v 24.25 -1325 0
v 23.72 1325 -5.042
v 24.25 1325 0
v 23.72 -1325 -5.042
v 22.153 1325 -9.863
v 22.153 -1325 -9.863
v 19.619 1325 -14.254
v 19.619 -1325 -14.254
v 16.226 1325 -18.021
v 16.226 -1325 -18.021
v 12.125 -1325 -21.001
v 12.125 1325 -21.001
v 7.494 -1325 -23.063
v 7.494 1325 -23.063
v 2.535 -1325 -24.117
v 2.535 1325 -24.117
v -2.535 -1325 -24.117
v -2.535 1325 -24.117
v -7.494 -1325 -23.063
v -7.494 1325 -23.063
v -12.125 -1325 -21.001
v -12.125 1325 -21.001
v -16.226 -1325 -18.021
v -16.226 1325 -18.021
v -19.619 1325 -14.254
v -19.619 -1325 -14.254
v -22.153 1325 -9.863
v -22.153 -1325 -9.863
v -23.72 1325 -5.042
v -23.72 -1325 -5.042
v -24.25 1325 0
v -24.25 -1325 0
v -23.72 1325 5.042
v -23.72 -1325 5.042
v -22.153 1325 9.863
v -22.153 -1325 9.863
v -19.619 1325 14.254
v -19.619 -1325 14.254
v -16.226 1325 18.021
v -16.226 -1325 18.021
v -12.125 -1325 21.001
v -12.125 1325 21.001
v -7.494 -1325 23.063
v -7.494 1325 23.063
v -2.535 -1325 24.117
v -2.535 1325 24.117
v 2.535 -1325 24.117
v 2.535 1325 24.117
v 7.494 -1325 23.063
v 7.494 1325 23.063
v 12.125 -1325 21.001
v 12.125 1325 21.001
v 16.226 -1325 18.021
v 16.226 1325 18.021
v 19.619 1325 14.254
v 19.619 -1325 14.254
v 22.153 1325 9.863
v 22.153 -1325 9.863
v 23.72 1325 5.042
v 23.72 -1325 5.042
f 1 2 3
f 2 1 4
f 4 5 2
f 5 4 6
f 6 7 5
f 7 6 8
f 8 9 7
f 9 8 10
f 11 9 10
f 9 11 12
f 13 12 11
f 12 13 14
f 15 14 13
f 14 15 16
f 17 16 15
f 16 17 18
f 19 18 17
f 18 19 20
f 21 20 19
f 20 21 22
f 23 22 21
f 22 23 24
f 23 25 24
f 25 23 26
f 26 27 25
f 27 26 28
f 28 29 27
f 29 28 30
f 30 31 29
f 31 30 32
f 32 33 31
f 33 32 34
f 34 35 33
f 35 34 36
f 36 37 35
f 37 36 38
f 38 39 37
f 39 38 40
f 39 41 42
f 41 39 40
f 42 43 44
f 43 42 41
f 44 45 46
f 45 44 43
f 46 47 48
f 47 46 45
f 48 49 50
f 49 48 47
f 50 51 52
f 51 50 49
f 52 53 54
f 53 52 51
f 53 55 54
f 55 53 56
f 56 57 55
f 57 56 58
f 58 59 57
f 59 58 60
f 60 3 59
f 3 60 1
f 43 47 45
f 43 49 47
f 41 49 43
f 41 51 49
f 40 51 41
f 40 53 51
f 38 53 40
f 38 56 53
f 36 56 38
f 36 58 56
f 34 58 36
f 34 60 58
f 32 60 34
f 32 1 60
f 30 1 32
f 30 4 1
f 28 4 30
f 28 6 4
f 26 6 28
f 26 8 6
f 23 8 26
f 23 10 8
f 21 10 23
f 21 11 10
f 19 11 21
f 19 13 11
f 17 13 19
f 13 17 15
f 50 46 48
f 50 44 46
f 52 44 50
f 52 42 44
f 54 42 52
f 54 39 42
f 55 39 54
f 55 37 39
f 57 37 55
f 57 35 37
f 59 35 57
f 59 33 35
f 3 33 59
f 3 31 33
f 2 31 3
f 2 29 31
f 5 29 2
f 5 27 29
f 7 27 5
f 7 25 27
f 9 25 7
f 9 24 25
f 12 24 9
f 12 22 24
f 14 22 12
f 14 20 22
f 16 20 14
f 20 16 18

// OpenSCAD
//use <Upor.scad>;


diamVnesh=48.5;
lenTotal=2650;    // вместе с удлинителями


module BalkaMin() {

    //$fn=100;
    
    rotate([-90,0,0]) 
    cylinder(h=lenTotal, r=diamVnesh/2, center=true);

}

BalkaMin();
